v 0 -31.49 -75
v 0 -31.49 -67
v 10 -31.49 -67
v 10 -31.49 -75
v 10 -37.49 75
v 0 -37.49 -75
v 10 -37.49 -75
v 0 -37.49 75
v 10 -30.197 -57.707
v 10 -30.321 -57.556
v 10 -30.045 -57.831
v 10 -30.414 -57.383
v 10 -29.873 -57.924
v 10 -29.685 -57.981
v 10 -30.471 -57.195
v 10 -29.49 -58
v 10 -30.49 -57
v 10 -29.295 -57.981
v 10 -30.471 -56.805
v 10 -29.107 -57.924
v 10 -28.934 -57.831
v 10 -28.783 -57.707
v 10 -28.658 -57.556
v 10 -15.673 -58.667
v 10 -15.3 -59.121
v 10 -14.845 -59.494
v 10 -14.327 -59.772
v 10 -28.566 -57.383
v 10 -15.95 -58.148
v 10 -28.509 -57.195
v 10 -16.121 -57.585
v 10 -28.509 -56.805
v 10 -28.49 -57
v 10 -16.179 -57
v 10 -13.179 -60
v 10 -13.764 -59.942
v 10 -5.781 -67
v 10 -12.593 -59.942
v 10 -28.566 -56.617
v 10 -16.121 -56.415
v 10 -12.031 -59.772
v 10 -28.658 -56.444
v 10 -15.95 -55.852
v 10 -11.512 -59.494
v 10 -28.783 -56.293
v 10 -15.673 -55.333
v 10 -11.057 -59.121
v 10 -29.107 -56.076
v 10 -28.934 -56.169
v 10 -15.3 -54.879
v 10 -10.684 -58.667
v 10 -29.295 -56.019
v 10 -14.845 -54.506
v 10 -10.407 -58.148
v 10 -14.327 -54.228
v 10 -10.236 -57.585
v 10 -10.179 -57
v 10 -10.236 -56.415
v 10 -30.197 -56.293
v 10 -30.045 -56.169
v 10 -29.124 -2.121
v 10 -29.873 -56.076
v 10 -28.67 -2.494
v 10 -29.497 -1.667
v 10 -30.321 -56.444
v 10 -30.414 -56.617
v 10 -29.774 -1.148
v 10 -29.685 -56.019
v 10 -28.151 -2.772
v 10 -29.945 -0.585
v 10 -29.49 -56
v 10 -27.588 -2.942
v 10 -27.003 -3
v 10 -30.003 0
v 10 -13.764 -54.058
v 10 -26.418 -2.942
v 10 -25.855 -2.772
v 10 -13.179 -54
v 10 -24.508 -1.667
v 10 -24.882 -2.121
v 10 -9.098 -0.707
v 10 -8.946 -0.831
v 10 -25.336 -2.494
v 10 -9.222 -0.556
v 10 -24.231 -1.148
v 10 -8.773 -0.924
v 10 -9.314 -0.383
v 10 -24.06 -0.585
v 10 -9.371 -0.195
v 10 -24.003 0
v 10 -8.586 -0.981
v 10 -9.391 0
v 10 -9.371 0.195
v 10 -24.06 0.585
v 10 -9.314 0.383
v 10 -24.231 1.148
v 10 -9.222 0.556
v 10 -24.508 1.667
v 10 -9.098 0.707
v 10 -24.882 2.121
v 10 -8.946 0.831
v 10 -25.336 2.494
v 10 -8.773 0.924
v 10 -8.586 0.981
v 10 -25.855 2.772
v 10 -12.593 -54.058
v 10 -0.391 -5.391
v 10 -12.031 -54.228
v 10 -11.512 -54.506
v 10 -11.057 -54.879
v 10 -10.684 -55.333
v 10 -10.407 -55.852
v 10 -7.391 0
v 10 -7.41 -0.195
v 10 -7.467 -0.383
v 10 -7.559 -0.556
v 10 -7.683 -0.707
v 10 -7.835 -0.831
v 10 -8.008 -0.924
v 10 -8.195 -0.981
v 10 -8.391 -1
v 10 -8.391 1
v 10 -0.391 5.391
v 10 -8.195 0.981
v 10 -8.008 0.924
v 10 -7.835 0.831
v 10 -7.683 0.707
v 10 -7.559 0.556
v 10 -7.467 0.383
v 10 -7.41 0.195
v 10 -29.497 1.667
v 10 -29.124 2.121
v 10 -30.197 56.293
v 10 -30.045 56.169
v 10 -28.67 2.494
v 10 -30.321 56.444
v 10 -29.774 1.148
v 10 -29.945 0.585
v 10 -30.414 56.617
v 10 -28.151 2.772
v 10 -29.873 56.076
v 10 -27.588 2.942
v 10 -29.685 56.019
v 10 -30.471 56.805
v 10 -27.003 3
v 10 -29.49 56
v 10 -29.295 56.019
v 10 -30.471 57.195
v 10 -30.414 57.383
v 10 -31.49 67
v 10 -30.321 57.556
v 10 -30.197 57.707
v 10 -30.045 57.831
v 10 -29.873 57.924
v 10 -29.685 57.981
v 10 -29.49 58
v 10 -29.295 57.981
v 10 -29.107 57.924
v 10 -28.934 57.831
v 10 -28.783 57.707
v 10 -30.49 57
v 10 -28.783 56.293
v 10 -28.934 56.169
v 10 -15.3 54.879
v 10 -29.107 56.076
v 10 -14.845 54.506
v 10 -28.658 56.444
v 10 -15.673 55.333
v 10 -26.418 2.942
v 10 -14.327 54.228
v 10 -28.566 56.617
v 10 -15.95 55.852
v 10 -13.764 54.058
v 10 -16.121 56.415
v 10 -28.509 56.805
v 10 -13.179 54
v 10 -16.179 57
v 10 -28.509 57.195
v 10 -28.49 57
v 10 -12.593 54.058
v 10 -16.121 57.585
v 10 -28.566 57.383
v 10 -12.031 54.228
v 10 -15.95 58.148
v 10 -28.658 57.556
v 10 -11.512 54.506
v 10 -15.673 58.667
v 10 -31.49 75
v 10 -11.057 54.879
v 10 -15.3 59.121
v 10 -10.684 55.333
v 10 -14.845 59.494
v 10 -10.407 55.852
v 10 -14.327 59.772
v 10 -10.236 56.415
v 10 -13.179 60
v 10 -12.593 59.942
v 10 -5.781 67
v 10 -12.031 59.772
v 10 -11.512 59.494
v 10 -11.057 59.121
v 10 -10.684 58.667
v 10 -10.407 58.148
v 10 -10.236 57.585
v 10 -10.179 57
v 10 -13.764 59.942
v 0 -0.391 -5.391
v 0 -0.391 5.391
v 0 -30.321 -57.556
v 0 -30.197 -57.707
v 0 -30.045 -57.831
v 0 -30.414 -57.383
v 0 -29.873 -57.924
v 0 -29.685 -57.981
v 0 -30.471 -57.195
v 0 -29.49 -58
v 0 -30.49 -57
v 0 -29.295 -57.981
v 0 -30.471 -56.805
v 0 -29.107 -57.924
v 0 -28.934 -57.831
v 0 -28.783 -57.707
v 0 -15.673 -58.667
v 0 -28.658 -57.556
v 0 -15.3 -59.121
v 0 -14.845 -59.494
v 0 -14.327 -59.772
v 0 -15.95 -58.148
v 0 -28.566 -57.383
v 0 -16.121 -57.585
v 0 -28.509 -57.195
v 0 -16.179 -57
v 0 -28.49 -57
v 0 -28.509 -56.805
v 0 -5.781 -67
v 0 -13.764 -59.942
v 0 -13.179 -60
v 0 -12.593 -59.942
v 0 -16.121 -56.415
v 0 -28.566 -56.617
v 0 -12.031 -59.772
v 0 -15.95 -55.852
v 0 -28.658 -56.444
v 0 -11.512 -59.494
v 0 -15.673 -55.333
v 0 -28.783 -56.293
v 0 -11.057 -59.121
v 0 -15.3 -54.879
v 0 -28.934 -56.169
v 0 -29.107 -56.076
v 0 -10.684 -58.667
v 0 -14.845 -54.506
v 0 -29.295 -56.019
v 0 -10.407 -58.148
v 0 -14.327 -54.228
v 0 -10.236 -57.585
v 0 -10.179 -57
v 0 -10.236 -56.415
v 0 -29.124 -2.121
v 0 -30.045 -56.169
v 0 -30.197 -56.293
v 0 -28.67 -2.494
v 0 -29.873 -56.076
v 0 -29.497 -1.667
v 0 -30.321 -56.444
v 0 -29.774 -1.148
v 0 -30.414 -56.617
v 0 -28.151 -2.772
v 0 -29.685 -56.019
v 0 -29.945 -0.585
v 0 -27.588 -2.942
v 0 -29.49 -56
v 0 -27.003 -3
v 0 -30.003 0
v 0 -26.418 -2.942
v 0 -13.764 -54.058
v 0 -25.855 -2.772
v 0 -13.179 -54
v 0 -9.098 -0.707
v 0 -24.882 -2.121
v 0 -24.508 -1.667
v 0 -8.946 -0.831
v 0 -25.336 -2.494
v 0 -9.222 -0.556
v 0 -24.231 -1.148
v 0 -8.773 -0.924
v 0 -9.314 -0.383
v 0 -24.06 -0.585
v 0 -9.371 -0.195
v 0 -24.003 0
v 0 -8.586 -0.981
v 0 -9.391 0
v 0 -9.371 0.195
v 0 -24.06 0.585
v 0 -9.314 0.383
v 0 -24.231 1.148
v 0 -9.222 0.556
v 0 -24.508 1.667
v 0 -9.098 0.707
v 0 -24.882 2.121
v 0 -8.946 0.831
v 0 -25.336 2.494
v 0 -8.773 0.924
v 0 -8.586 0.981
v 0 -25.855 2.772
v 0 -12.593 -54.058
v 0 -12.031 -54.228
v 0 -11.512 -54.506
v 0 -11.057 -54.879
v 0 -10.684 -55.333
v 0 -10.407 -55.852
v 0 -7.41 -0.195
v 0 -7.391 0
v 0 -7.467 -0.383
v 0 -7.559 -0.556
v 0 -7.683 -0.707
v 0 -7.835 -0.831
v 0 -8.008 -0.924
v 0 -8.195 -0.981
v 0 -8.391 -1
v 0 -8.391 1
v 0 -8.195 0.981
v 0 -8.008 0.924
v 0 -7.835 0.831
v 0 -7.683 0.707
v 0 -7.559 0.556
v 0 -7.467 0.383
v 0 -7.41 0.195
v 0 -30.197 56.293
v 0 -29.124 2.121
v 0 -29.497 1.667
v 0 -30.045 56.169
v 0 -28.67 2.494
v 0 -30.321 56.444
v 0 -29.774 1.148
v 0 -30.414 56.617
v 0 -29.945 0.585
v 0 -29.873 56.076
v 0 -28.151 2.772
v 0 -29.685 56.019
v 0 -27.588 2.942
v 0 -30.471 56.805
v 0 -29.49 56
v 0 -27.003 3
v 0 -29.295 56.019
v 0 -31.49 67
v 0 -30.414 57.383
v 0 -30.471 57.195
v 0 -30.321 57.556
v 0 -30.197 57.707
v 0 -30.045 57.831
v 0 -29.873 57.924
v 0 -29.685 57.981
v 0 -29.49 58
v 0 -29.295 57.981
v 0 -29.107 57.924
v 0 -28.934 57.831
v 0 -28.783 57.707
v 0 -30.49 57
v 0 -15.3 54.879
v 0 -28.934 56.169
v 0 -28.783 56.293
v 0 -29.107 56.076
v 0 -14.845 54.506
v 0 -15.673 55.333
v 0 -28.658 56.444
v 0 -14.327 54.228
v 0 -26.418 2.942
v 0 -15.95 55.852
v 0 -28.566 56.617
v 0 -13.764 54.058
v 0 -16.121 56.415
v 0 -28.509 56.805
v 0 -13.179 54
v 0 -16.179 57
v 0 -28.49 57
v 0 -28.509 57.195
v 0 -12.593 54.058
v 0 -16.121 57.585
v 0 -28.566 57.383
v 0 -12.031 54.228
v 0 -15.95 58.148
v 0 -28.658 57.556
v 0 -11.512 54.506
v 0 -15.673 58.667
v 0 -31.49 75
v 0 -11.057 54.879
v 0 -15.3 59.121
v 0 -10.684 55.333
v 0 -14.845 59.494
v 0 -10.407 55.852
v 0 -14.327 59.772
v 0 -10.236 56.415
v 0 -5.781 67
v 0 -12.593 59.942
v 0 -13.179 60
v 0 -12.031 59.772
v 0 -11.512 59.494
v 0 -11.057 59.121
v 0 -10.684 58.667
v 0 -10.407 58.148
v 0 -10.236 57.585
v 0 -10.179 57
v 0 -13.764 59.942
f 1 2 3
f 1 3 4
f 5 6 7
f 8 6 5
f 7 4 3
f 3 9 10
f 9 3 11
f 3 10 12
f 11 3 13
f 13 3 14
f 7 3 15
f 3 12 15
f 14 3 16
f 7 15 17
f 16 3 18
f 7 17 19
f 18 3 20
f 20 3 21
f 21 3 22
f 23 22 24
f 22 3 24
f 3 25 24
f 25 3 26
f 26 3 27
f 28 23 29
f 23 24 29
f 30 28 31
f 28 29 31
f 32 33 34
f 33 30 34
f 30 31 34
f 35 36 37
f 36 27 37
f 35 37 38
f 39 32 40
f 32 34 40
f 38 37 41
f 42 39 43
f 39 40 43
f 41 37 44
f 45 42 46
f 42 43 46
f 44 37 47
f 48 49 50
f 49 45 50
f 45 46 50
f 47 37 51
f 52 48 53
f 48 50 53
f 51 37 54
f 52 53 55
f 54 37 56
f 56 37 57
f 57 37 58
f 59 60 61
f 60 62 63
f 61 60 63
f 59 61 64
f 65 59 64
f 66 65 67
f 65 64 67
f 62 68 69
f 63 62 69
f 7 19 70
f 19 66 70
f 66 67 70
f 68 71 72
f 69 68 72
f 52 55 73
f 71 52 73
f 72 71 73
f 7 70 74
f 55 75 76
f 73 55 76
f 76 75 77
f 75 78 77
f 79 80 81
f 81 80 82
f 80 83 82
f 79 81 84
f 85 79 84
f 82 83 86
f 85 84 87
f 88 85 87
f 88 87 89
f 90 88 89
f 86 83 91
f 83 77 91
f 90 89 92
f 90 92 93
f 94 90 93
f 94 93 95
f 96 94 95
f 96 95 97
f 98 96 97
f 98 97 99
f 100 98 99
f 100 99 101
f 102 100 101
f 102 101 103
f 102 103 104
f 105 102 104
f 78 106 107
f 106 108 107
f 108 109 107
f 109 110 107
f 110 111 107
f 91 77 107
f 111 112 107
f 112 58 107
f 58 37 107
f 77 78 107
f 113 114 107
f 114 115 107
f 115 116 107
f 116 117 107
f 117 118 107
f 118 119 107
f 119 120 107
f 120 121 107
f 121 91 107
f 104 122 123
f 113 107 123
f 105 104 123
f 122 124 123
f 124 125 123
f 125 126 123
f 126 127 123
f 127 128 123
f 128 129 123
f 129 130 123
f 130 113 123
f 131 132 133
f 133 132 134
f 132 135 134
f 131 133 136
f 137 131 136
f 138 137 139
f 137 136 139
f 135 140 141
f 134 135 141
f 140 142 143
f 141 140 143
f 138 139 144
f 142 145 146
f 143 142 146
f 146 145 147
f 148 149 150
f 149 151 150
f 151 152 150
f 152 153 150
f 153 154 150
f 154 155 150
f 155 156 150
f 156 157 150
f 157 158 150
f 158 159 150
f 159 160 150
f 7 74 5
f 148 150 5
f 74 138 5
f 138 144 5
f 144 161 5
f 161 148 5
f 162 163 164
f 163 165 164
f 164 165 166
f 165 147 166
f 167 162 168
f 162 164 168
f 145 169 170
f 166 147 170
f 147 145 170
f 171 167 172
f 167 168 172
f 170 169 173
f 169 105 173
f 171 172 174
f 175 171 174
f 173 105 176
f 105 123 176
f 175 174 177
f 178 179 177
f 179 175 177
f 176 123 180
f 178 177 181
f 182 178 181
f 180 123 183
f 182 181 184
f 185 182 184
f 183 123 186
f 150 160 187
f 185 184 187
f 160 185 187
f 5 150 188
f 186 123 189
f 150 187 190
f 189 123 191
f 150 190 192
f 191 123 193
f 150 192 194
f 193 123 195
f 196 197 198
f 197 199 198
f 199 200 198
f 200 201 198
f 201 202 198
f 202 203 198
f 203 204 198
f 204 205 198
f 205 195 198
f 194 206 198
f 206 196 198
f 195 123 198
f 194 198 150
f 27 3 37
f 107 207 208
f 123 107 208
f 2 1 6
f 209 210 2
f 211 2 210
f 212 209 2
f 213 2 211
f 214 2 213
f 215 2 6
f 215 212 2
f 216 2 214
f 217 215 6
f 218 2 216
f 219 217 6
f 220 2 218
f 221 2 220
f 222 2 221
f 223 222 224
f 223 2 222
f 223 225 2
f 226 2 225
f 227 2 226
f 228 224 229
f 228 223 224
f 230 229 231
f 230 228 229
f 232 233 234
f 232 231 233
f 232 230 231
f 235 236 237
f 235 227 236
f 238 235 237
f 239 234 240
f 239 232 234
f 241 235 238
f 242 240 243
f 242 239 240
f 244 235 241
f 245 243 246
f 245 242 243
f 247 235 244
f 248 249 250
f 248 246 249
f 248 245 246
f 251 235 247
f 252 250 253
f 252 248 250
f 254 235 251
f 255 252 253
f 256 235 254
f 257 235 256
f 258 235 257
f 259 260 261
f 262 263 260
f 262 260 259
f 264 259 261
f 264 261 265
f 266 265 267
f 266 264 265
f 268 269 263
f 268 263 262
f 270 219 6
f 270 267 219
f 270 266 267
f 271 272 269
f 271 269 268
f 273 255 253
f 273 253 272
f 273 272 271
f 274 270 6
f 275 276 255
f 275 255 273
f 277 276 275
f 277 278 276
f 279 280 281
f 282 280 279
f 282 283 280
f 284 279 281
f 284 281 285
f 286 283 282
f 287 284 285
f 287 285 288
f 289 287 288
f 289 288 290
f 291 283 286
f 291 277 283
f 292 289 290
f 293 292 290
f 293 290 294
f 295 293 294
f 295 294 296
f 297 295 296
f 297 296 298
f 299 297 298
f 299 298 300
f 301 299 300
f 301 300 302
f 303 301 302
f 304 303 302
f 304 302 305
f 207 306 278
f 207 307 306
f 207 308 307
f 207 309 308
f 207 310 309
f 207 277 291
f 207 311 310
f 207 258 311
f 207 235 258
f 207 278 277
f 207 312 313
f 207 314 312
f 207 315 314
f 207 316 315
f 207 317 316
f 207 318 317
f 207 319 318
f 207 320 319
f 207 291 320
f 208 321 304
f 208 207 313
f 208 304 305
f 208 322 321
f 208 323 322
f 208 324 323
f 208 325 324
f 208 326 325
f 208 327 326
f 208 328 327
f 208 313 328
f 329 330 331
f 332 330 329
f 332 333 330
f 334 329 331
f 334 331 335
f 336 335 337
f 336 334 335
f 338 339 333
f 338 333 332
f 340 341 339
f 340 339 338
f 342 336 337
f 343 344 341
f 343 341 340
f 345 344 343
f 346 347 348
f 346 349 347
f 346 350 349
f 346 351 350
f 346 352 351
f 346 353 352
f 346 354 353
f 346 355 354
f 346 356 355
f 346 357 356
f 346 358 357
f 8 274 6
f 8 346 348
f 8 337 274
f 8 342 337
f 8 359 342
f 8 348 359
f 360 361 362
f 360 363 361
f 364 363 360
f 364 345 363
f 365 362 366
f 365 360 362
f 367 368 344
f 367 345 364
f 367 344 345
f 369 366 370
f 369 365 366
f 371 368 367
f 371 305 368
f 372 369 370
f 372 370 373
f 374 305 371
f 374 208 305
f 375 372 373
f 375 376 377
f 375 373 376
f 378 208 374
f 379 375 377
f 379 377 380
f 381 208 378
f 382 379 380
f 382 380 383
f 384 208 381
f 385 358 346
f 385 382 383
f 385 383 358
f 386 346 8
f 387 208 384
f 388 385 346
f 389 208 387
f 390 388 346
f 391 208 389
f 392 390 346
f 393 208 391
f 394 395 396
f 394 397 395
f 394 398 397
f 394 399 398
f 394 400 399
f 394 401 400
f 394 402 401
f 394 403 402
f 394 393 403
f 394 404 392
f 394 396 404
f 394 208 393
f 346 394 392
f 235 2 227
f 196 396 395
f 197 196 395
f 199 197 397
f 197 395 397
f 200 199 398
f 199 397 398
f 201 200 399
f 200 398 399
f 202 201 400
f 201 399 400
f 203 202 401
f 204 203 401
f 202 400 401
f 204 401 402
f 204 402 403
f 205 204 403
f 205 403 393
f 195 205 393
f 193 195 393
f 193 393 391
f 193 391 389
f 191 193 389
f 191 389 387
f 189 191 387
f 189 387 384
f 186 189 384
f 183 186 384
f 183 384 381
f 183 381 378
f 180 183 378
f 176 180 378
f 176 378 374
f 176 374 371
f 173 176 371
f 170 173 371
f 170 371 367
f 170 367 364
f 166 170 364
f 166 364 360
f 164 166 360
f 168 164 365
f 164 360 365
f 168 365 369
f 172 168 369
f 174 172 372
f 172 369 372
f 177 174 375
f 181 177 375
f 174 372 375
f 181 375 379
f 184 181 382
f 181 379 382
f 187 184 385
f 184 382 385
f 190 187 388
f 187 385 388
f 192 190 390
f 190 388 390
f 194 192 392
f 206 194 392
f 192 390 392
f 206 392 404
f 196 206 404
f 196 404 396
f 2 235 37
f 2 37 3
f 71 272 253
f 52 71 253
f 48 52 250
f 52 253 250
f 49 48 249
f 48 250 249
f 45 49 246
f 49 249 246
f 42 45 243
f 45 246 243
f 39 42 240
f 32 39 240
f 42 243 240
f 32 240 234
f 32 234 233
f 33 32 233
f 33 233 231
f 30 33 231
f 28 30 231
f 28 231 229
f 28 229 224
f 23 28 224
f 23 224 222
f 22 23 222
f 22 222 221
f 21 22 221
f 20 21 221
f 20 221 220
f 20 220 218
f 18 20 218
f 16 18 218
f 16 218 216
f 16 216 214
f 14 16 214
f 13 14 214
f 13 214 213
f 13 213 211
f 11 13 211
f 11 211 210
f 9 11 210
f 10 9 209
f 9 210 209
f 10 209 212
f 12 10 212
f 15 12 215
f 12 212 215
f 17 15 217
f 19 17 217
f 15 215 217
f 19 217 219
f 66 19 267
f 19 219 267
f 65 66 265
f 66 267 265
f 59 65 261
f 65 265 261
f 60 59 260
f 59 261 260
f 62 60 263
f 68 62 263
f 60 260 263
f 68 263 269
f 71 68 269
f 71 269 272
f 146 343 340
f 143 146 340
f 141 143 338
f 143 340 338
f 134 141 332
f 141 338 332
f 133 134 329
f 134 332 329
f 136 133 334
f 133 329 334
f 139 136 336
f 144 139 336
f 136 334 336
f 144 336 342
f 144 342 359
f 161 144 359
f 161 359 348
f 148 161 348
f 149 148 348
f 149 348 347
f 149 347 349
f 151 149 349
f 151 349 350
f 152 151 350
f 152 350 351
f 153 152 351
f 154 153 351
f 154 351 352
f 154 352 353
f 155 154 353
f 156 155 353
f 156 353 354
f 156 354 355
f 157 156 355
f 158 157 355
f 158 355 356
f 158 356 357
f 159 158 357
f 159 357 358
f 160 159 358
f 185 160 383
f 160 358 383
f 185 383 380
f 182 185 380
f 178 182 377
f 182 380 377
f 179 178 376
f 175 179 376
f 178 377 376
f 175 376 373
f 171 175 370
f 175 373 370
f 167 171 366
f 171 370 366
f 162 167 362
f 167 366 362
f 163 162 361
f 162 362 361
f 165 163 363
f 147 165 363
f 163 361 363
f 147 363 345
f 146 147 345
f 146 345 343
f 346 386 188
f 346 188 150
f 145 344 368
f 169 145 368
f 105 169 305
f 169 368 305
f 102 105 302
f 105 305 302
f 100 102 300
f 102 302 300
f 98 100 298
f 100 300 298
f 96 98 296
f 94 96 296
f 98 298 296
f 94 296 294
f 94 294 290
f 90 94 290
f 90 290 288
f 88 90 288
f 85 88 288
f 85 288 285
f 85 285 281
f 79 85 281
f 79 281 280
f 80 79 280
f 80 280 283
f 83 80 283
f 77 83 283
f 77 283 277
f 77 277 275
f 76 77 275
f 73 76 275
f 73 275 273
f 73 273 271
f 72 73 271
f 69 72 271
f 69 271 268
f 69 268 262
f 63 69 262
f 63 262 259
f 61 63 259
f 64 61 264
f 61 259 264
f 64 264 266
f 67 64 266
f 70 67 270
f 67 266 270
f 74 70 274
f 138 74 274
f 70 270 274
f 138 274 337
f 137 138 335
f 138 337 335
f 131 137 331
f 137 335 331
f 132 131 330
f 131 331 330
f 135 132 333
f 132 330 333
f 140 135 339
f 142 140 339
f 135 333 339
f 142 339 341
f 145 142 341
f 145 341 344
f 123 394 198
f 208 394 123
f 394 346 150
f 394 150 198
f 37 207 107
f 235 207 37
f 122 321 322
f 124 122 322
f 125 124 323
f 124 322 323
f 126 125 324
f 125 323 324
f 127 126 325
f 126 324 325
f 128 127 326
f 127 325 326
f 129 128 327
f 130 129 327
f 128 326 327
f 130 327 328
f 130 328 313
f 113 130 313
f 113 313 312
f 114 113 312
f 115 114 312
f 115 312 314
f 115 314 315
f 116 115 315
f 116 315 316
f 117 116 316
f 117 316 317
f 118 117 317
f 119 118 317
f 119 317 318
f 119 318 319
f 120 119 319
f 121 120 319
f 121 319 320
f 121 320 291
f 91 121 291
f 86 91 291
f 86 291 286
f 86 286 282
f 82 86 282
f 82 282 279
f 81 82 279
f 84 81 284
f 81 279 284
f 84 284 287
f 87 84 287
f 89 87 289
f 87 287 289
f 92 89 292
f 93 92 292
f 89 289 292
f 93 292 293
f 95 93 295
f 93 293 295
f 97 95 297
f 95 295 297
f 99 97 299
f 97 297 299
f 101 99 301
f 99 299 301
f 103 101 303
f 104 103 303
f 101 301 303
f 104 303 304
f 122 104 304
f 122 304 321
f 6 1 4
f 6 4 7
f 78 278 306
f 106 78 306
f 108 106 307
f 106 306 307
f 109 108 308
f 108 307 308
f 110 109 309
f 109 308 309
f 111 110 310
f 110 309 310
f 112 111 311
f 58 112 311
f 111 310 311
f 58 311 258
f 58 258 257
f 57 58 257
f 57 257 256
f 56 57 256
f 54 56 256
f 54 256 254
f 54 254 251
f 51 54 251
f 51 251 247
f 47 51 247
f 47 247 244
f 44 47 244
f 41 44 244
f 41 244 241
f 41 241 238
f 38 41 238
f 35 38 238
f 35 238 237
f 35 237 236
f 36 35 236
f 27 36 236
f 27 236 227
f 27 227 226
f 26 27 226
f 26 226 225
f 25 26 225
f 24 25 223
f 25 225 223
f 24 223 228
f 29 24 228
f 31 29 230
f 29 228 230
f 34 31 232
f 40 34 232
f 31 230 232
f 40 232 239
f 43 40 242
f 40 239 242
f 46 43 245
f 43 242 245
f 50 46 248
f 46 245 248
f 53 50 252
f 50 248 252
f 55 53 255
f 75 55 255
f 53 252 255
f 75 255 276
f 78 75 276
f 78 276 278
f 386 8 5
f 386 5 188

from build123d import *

# Parameters (mm, degrees)
RESSALTO_EXTRUS_O2_DEPTH = 10
SKETCH1_R                = 1
SKETCH1_R_2              = 3
CUT_EXTRUDE1_DEPTH       = 85.442226256


with BuildPart() as part:
    # Esboço2 → Ressalto-extrusão2 (new body)
    with BuildSketch(Plane(origin=(0, 0, 0), x_dir=(0, 0, -1), z_dir=(1, 0, 0))):
        Polygon((67, -31.48985963), (75, -31.48985963), (75, -37.48985963), (-75, -37.48985963), (-75, -31.48985963), (-67, -31.48985963), (-67, -5.780687565), (-5.390847643, -0.390585164), (0, -0.390585164), (5.390847643, -0.390585164), (67, -5.780687565), align=None)
    extrude(amount=RESSALTO_EXTRUS_O2_DEPTH)

    # Sketch1 → Cut-Extrude1 (cut, through all)
    with BuildSketch(Plane.ZY):
        with Locations((-57, -29.48985963)):
            Circle(SKETCH1_R)
        with Locations(Location((57, -29.48985963, 0), (0, 0, 180))):
            Circle(SKETCH1_R)
        with Locations((0, -8.390585164)):
            Circle(SKETCH1_R)
        with Locations((0, -27.002843351)):
            Circle(SKETCH1_R_2)
        with Locations((-57, -13.178770397)):
            Circle(SKETCH1_R_2)
        with Locations((57, -13.178770397)):
            Circle(SKETCH1_R_2)
    extrude(amount=-CUT_EXTRUDE1_DEPTH, mode=Mode.SUBTRACT)


solid = part.part
